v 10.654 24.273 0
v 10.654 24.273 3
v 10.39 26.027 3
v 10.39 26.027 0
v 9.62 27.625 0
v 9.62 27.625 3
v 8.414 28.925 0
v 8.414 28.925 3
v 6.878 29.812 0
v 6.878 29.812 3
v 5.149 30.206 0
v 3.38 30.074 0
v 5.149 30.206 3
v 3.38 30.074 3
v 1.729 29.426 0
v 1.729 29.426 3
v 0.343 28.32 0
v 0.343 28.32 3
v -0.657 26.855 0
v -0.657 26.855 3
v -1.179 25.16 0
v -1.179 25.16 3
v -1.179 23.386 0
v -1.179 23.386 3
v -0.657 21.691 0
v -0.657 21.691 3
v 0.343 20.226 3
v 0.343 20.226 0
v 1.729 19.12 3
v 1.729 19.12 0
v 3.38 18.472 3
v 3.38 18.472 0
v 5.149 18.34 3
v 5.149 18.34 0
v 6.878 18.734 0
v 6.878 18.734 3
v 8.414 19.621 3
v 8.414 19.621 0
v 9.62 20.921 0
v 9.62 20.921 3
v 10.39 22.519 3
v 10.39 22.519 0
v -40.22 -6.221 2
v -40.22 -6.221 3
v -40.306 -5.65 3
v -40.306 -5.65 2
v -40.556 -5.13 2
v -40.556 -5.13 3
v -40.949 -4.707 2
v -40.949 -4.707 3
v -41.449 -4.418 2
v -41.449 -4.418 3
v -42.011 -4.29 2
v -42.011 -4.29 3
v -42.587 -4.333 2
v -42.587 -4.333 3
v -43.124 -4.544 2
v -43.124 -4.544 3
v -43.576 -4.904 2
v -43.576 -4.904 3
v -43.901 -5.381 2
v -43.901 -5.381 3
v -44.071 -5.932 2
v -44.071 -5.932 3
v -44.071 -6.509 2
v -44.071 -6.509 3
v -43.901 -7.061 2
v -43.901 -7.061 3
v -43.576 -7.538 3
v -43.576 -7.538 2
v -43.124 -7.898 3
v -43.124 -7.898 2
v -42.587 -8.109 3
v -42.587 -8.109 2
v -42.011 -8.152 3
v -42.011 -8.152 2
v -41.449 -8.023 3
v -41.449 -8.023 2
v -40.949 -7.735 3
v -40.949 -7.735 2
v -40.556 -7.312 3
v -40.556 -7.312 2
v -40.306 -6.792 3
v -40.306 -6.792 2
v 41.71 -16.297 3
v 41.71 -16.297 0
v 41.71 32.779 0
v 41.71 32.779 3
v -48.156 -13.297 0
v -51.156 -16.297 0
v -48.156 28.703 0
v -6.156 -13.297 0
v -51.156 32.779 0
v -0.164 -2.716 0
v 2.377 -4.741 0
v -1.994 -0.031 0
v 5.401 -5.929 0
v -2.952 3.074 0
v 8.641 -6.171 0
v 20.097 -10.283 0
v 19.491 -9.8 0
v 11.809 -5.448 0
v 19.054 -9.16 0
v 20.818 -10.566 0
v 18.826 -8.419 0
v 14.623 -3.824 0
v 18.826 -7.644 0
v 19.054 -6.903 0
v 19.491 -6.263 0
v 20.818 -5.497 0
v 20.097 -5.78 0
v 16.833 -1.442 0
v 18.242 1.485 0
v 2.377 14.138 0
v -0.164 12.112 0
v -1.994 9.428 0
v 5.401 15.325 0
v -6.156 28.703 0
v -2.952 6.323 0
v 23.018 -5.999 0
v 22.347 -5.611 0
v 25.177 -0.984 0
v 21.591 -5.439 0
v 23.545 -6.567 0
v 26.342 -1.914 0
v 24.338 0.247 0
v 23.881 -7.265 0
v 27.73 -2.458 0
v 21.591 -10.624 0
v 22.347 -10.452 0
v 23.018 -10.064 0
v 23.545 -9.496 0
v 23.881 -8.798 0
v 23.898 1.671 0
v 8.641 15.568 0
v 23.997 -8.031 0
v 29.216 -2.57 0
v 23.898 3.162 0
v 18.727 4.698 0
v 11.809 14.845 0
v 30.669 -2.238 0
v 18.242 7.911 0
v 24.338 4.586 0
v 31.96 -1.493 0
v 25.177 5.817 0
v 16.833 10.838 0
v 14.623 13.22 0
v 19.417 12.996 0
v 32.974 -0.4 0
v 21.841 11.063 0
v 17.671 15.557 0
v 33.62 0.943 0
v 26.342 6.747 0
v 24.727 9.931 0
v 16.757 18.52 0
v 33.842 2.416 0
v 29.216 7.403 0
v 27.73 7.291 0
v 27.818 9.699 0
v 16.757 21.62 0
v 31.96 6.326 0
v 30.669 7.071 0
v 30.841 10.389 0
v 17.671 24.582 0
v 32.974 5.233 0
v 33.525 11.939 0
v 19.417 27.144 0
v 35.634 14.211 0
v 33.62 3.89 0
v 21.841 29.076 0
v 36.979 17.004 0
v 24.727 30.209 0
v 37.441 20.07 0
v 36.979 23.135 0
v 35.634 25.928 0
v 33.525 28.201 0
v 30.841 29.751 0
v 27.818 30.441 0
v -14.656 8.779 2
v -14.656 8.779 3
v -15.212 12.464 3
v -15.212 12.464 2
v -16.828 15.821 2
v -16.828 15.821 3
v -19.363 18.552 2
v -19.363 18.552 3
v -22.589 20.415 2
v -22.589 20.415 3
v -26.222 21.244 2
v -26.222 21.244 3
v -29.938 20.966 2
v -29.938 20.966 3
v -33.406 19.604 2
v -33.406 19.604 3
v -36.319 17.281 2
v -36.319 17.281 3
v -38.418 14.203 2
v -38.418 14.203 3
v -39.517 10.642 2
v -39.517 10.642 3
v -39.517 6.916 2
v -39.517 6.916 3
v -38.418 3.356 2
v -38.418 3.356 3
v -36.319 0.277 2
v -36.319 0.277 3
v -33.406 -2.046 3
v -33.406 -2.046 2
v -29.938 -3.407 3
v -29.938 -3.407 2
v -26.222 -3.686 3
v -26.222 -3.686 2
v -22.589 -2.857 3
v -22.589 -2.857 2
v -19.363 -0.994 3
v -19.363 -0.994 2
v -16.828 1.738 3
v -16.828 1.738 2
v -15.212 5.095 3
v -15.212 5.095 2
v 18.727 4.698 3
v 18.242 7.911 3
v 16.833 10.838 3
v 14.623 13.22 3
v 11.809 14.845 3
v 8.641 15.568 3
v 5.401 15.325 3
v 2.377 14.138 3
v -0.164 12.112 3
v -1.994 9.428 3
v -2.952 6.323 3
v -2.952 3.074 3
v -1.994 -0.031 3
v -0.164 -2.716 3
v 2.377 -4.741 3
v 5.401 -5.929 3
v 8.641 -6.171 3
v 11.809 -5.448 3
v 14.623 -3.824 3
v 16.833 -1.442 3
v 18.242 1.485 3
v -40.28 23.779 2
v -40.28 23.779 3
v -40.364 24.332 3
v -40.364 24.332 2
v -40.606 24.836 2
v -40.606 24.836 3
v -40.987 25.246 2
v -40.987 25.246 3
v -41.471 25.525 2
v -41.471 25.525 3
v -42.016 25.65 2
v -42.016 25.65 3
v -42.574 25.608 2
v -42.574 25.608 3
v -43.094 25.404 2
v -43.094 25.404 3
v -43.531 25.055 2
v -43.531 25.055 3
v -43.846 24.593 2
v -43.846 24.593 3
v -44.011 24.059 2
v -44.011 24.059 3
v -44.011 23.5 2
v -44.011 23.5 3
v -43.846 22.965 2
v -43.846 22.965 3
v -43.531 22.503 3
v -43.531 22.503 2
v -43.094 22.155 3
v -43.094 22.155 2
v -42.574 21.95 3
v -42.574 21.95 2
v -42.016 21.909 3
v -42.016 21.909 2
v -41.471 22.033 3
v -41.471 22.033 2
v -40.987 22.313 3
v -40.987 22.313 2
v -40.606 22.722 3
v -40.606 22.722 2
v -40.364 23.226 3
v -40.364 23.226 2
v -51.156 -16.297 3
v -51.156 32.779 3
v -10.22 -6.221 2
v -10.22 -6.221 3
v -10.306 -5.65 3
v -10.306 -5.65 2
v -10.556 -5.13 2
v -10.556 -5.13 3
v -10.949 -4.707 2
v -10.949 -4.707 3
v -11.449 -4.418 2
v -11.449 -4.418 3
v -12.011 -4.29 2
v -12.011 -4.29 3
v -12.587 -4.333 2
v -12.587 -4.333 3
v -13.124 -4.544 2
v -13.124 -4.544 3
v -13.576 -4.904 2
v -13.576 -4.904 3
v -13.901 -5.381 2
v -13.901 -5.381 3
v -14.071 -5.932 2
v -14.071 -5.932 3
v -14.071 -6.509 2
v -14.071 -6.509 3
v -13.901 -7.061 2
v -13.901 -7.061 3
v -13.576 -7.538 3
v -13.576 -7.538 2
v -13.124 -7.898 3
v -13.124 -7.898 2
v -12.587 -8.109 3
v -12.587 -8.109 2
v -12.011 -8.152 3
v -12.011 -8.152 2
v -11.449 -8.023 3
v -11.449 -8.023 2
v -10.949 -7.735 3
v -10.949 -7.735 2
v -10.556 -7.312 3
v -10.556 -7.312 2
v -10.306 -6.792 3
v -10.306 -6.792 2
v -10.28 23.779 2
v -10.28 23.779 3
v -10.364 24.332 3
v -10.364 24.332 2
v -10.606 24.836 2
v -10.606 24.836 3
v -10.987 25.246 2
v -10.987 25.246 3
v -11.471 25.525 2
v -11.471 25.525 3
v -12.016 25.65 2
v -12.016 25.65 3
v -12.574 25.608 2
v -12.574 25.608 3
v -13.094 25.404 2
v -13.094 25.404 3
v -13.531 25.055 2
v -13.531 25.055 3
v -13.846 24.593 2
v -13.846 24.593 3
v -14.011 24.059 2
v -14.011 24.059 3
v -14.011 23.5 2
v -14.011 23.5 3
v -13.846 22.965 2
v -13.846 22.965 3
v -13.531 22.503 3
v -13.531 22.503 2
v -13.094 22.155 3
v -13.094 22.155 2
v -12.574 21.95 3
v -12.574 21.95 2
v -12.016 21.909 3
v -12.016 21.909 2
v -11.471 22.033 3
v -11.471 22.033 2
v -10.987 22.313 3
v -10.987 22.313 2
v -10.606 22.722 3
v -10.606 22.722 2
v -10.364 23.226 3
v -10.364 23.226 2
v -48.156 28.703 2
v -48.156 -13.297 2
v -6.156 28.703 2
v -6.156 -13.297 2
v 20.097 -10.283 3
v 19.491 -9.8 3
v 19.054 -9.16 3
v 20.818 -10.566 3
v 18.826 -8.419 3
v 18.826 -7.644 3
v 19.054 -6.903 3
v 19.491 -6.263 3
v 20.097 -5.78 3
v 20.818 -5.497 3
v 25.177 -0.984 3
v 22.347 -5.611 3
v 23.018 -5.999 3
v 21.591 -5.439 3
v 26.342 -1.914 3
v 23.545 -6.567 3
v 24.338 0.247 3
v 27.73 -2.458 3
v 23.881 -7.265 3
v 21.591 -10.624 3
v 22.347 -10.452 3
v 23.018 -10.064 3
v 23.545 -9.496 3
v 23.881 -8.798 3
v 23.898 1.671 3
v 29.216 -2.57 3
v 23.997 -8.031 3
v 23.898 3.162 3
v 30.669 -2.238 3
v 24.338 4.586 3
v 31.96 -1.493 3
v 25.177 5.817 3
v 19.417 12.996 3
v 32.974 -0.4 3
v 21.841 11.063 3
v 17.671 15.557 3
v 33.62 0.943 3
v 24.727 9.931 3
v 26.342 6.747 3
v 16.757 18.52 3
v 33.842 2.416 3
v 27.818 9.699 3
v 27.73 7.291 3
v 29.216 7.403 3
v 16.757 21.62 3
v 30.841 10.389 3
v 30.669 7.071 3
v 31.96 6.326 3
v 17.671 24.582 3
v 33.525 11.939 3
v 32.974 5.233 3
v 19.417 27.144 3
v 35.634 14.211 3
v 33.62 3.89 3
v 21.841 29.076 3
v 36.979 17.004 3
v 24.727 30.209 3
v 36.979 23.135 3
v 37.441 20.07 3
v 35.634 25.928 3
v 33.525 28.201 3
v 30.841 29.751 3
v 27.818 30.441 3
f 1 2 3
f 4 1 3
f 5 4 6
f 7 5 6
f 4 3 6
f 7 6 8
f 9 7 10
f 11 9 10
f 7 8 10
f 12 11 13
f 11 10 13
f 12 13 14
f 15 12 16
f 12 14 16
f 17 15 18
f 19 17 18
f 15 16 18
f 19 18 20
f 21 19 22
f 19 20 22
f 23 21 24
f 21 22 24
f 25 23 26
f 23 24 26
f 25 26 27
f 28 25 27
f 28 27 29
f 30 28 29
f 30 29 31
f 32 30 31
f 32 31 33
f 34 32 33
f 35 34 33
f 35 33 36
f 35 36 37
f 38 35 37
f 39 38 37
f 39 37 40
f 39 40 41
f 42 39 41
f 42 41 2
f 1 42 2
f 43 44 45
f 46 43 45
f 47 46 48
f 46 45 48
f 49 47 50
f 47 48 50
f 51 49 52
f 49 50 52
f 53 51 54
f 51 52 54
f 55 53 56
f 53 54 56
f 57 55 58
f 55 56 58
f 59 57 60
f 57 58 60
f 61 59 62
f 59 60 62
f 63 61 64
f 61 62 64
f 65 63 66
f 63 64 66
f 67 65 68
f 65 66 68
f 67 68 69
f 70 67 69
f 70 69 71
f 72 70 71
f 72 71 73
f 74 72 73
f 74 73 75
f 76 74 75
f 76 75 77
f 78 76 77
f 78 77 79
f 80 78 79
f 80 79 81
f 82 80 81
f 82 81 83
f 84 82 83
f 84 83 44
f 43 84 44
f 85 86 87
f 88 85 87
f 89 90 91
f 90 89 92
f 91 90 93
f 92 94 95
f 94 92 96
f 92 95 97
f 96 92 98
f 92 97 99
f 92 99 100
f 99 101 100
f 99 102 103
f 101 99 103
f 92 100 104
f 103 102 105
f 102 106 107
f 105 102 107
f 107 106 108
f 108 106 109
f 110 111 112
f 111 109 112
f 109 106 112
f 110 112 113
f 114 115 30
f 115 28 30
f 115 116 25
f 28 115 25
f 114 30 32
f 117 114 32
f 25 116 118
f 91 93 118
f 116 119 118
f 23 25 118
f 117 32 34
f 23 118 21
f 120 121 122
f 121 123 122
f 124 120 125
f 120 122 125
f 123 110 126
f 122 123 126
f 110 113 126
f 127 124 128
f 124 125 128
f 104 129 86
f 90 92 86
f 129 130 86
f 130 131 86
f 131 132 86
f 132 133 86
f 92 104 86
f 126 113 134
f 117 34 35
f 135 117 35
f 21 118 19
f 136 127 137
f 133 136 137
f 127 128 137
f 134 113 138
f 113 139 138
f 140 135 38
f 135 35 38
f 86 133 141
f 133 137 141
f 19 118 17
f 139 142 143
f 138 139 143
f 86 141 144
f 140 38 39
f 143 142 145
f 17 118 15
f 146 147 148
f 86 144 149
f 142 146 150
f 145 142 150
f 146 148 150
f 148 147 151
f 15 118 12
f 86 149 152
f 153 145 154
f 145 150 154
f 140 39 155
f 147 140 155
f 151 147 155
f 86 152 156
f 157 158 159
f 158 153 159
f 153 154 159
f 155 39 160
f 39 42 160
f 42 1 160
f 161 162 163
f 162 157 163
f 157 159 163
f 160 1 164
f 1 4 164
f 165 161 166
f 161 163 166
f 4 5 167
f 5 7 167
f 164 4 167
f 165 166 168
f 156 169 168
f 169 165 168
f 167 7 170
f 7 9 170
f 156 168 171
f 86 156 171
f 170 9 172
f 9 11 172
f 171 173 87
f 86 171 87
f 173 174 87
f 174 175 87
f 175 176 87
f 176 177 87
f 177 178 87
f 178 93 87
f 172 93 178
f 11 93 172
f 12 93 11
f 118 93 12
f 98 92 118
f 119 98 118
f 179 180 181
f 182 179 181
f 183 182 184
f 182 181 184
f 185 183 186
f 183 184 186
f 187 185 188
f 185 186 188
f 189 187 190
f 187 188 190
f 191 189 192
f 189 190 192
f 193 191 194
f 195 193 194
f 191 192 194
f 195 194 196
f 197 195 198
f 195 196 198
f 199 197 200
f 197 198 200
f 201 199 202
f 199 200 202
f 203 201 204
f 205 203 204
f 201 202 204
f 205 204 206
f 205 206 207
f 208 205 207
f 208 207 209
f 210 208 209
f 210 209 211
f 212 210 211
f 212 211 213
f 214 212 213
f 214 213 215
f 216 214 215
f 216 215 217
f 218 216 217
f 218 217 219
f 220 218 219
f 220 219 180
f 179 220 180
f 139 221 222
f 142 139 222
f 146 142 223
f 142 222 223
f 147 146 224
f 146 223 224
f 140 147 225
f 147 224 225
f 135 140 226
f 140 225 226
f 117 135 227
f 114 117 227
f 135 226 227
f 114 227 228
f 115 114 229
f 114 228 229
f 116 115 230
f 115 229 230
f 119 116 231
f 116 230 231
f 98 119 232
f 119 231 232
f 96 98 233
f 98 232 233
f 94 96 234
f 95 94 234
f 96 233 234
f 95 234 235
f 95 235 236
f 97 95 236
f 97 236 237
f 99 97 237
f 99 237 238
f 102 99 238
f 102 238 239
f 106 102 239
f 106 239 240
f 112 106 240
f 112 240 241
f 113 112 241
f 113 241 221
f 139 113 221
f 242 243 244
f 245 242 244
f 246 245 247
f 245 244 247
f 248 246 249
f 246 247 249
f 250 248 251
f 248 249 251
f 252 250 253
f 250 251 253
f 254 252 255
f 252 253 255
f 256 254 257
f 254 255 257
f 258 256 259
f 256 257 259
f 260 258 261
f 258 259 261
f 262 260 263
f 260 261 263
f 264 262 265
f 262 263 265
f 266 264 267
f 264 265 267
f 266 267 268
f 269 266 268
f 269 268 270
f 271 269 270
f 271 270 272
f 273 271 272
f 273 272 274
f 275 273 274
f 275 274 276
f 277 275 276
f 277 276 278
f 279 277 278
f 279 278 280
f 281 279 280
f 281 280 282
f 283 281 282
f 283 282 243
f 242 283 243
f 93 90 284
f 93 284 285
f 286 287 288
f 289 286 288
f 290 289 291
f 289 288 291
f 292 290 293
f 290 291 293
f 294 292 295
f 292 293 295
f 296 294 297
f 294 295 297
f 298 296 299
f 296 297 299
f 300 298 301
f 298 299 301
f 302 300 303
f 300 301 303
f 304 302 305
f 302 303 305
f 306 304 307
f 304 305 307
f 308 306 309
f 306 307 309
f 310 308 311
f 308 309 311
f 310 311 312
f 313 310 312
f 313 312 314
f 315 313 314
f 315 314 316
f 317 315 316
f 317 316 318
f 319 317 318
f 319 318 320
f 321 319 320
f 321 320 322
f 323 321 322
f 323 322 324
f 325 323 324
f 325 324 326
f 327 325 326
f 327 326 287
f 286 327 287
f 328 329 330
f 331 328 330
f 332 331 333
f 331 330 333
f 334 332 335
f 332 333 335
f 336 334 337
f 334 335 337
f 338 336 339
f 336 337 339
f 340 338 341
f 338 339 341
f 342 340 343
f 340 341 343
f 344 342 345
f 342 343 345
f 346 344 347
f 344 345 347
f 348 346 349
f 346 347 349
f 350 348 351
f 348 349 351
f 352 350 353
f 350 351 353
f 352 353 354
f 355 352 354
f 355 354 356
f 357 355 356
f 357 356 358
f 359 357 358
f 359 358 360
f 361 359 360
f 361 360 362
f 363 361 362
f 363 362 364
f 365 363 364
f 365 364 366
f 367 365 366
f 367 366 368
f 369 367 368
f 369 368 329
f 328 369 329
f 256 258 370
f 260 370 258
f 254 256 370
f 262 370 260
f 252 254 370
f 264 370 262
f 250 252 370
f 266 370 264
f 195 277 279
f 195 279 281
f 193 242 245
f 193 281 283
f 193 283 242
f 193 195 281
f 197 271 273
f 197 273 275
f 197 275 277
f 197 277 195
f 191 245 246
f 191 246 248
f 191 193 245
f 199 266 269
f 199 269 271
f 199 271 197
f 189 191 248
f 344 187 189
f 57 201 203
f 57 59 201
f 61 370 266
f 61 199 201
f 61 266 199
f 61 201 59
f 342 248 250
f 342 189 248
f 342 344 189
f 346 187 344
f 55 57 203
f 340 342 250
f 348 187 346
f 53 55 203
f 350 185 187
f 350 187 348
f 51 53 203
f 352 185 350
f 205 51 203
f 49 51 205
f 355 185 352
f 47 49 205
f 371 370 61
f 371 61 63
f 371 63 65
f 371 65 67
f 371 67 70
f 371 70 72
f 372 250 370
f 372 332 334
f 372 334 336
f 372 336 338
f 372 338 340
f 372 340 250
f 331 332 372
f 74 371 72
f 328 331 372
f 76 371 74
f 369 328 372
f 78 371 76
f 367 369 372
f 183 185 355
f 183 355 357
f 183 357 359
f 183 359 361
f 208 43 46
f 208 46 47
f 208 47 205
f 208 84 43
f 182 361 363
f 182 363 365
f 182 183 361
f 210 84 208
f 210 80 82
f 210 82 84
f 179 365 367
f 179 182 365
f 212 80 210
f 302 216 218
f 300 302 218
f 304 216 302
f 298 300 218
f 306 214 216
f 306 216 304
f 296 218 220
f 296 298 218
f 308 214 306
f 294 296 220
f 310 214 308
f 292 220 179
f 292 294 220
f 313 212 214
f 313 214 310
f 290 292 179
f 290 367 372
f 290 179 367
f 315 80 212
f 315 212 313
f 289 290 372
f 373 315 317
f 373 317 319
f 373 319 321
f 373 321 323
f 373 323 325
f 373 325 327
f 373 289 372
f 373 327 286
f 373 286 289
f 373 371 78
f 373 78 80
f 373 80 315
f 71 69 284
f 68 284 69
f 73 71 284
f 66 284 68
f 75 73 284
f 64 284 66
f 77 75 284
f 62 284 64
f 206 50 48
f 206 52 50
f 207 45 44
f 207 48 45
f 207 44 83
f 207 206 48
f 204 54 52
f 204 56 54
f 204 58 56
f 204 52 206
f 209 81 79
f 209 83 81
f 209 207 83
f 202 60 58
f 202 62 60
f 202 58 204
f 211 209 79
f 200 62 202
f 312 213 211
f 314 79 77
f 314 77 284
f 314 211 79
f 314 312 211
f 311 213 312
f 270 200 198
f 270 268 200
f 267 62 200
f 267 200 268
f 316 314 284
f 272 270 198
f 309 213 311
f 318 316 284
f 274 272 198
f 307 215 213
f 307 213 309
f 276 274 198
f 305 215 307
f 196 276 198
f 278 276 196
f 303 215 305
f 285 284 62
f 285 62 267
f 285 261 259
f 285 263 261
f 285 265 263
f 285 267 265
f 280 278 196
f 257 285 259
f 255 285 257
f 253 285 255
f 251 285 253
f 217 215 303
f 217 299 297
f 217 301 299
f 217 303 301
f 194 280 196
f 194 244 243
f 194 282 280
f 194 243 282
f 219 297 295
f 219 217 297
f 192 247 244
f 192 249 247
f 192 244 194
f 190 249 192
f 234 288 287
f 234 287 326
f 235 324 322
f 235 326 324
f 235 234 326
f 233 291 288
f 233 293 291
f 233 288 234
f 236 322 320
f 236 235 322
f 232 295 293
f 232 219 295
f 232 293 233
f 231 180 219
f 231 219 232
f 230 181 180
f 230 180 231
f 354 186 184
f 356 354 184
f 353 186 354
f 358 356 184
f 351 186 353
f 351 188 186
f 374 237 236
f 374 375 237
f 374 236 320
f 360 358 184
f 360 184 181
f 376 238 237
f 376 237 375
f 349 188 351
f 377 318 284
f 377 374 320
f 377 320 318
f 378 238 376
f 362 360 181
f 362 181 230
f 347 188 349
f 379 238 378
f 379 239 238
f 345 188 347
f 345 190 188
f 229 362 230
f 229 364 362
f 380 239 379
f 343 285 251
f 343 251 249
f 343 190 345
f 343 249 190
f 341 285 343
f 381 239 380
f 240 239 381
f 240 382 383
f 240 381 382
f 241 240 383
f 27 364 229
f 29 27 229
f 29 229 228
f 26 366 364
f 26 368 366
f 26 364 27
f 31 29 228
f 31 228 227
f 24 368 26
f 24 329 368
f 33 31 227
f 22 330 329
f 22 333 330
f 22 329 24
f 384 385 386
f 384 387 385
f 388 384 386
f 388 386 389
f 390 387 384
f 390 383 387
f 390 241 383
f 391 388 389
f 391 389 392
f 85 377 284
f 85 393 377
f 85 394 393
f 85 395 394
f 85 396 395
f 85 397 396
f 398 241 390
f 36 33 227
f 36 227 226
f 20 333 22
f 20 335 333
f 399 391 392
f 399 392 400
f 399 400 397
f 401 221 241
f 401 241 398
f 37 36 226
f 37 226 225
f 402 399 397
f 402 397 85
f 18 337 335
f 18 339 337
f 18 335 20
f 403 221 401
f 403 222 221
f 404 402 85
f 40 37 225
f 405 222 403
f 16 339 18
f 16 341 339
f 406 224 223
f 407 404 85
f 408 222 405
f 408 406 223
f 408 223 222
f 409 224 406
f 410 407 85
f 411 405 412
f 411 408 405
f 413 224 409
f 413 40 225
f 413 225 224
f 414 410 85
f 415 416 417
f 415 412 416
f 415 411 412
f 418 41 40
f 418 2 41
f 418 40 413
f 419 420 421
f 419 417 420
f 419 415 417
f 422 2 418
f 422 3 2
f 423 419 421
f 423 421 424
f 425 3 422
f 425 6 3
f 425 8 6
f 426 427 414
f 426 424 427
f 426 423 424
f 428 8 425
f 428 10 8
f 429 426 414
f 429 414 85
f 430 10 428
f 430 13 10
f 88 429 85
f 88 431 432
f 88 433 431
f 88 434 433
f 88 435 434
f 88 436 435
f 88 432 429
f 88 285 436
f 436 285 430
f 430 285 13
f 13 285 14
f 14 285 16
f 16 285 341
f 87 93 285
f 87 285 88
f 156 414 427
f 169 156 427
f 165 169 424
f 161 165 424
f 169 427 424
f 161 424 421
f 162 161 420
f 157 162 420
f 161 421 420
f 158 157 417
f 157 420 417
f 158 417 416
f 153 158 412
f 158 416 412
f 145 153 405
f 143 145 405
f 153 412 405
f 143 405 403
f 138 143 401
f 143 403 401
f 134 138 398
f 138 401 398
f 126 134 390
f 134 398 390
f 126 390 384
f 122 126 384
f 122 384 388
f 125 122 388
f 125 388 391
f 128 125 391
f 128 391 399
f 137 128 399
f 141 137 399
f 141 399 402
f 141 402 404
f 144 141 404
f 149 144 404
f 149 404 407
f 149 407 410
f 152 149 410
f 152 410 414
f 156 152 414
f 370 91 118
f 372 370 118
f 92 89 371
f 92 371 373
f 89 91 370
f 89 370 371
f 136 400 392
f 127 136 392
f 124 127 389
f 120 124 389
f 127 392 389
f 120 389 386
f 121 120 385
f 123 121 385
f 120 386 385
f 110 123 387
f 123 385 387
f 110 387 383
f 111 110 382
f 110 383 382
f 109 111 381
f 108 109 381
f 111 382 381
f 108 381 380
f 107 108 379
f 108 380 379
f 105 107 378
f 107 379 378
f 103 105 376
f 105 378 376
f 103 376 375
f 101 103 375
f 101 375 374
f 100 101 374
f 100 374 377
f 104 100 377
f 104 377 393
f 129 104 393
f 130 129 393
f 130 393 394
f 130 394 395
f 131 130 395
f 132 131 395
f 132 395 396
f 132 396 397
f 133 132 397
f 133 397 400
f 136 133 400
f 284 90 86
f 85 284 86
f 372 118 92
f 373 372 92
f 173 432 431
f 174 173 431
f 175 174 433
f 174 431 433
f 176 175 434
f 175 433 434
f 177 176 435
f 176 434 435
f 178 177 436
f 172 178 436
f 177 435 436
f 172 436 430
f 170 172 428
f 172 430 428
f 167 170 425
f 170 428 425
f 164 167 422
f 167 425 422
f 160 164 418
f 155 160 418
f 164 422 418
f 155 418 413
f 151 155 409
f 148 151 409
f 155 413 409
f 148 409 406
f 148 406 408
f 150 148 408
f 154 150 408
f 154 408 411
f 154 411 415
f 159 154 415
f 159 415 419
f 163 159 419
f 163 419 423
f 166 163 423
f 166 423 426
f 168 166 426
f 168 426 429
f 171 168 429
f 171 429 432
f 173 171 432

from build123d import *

# Parameters (mm, degrees)
SKETCH_W        = 92.866455
SKETCH_H        = 49.076486
PAD_DEPTH       = 3
SKETCH001_R     = 1.87588
SKETCH001_R_2   = 1.936405
SKETCH001_R_3   = 12.5
SKETCH001_R_4   = 5.95
SKETCH001_R_5   = 5
SKETCH001_R_6   = 10.4
SKETCH001_R_7   = 10.9
SKETCH001_R_8   = 2.6
POCKET_DEPTH    = 5
SKETCH002_W     = 42
SKETCH002_H     = 42
POCKET001_DEPTH = 2


with BuildPart() as part:
    # Sketch → Pad (new body)
    with BuildSketch(Plane.XY):
        with Locations((-4.722953, 8.240901)):
            Rectangle(SKETCH_W, SKETCH_H)
    extrude(amount=PAD_DEPTH)

    # Sketch001 (on Face6 of Pad) → Pocket (cut)
    with BuildSketch(Plane.XY.offset(3)):
        with Locations((-42.156181, 23.779144)):
            Circle(SKETCH001_R)
        with Locations((-12.156181, 23.779144)):
            Circle(SKETCH001_R)
        with Locations((-12.156181, -6.220856)):
            Circle(SKETCH001_R_2)
        with Locations((-42.156181, -6.220856)):
            Circle(SKETCH001_R_2)
        with Locations((-27.156181, 8.779144)):
            Circle(SKETCH001_R_3)
        with Locations((4.704166, 24.273006)):
            Circle(SKETCH001_R_4)
        with Locations((28.842405, 2.41649)):
            Circle(SKETCH001_R_5)
        with Locations((27.041033, 20.069828)):
            Circle(SKETCH001_R_6)
        with Locations((7.826513, 4.698213)):
            Circle(SKETCH001_R_7)
        with Locations((21.396776, -8.031404)):
            Circle(SKETCH001_R_8)
    extrude(amount=-POCKET_DEPTH, mode=Mode.SUBTRACT)

    # Sketch002 (on Face4 of Pocket) → Pocket001 (cut)
    with BuildSketch(Plane(origin=(0, 0, 0), x_dir=(1, 0, 0), z_dir=(0, 0, -1))):
        with Locations((-27.156181, -7.702658)):
            Rectangle(SKETCH002_W, SKETCH002_H)
    extrude(amount=-POCKET001_DEPTH, mode=Mode.SUBTRACT)


solid = part.part
